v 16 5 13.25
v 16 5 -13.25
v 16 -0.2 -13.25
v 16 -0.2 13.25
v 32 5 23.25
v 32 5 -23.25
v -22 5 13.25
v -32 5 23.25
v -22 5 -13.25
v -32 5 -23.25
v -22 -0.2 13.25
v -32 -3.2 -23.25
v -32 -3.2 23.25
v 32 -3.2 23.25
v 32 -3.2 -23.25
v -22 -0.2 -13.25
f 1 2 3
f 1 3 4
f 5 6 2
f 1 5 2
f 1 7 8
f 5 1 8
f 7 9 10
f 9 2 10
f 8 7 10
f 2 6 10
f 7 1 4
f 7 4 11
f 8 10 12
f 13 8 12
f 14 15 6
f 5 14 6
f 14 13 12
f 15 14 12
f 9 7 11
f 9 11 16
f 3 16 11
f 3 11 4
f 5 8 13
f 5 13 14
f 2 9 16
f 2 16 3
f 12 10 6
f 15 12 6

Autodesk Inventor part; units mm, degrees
ref_plane "YZ Plane" through (0, 0, 0) normal (1, 0, 0) x (0, 1, 0)
ref_plane "XZ Plane" through (0, 0, 0) normal (0, 1, 0) x (-1, 0, 0)
ref_plane "XY Plane" through (0, 0, 0) normal (0, 0, 1) x (1, 0, 0)
sketch "Sketch5" plane through (0, 0, 0) normal (0, 0, 1) x (1, 0, 0)
  line L0 (-32, -5) -> (32, -5)
  line L1 (32, -5) -> (32, 5)
  line L2 (32, 5) -> (-32, 5)
  line L3 (-32, 5) -> (-32, -5)
  line L4 (-32, -5) -> (32, 5) construction
  line L5 (32, -5) -> (-32, 5) construction
  point P0 (0, 0)
  dimension "d17" = 64
  dimension "d18" = 10
extrude "Extrusion5" add sketch "Sketch5" along normal mid plane 46.5
sketch "Sketch17" plane through (-32, 5, 23.25) normal (0, 1, 0) x (1, 0, 0)
  line L0 (0, 46.5) -> (0, 0) projected
  line L1 (0, 23.25) -> (10, 23.25)
  line L2 (10, 23.25) -> (10, 10)
  line L3 (10, 10) -> (10, 36.5)
  line L4 (10, 36.5) -> (48, 36.5)
  line L5 (48, 36.5) -> (48, 10)
  line L6 (48, 10) -> (10, 10)
  point P0 (32, 23.25)
  dimension "d84" = 10
  dimension "d85" = 13.25
  dimension "d86" = 26.5
  dimension "d87" = 38
extrude "Extrusion15" cut sketch "Sketch17" against normal blind 5.2
sketch "Sketch18" plane through (-32, -5, 23.25) normal (-1, 0, 0) x (0, 0, 1)
  line L0 (-46.5, 0) -> (-46.5, 10) projected
  line L1 (0, 10) -> (0, 0) projected
  line L2 (-46.5, 0) -> (0, 0)
  line L3 (0, 0) -> (0, 1.8)
  line L4 (0, 1.8) -> (-46.5, 1.8)
  line L5 (-46.5, 1.8) -> (-46.5, 0)
  point P0 (-23.25, 5)
  point P1 (0, 1.8)
  point P2 (-46.5, 1.8)
  dimension "d90" = 1.8
extrude "Extrusion16" cut sketch "Sketch18" against normal through all
properties part number "Enclosure-Bottom"
